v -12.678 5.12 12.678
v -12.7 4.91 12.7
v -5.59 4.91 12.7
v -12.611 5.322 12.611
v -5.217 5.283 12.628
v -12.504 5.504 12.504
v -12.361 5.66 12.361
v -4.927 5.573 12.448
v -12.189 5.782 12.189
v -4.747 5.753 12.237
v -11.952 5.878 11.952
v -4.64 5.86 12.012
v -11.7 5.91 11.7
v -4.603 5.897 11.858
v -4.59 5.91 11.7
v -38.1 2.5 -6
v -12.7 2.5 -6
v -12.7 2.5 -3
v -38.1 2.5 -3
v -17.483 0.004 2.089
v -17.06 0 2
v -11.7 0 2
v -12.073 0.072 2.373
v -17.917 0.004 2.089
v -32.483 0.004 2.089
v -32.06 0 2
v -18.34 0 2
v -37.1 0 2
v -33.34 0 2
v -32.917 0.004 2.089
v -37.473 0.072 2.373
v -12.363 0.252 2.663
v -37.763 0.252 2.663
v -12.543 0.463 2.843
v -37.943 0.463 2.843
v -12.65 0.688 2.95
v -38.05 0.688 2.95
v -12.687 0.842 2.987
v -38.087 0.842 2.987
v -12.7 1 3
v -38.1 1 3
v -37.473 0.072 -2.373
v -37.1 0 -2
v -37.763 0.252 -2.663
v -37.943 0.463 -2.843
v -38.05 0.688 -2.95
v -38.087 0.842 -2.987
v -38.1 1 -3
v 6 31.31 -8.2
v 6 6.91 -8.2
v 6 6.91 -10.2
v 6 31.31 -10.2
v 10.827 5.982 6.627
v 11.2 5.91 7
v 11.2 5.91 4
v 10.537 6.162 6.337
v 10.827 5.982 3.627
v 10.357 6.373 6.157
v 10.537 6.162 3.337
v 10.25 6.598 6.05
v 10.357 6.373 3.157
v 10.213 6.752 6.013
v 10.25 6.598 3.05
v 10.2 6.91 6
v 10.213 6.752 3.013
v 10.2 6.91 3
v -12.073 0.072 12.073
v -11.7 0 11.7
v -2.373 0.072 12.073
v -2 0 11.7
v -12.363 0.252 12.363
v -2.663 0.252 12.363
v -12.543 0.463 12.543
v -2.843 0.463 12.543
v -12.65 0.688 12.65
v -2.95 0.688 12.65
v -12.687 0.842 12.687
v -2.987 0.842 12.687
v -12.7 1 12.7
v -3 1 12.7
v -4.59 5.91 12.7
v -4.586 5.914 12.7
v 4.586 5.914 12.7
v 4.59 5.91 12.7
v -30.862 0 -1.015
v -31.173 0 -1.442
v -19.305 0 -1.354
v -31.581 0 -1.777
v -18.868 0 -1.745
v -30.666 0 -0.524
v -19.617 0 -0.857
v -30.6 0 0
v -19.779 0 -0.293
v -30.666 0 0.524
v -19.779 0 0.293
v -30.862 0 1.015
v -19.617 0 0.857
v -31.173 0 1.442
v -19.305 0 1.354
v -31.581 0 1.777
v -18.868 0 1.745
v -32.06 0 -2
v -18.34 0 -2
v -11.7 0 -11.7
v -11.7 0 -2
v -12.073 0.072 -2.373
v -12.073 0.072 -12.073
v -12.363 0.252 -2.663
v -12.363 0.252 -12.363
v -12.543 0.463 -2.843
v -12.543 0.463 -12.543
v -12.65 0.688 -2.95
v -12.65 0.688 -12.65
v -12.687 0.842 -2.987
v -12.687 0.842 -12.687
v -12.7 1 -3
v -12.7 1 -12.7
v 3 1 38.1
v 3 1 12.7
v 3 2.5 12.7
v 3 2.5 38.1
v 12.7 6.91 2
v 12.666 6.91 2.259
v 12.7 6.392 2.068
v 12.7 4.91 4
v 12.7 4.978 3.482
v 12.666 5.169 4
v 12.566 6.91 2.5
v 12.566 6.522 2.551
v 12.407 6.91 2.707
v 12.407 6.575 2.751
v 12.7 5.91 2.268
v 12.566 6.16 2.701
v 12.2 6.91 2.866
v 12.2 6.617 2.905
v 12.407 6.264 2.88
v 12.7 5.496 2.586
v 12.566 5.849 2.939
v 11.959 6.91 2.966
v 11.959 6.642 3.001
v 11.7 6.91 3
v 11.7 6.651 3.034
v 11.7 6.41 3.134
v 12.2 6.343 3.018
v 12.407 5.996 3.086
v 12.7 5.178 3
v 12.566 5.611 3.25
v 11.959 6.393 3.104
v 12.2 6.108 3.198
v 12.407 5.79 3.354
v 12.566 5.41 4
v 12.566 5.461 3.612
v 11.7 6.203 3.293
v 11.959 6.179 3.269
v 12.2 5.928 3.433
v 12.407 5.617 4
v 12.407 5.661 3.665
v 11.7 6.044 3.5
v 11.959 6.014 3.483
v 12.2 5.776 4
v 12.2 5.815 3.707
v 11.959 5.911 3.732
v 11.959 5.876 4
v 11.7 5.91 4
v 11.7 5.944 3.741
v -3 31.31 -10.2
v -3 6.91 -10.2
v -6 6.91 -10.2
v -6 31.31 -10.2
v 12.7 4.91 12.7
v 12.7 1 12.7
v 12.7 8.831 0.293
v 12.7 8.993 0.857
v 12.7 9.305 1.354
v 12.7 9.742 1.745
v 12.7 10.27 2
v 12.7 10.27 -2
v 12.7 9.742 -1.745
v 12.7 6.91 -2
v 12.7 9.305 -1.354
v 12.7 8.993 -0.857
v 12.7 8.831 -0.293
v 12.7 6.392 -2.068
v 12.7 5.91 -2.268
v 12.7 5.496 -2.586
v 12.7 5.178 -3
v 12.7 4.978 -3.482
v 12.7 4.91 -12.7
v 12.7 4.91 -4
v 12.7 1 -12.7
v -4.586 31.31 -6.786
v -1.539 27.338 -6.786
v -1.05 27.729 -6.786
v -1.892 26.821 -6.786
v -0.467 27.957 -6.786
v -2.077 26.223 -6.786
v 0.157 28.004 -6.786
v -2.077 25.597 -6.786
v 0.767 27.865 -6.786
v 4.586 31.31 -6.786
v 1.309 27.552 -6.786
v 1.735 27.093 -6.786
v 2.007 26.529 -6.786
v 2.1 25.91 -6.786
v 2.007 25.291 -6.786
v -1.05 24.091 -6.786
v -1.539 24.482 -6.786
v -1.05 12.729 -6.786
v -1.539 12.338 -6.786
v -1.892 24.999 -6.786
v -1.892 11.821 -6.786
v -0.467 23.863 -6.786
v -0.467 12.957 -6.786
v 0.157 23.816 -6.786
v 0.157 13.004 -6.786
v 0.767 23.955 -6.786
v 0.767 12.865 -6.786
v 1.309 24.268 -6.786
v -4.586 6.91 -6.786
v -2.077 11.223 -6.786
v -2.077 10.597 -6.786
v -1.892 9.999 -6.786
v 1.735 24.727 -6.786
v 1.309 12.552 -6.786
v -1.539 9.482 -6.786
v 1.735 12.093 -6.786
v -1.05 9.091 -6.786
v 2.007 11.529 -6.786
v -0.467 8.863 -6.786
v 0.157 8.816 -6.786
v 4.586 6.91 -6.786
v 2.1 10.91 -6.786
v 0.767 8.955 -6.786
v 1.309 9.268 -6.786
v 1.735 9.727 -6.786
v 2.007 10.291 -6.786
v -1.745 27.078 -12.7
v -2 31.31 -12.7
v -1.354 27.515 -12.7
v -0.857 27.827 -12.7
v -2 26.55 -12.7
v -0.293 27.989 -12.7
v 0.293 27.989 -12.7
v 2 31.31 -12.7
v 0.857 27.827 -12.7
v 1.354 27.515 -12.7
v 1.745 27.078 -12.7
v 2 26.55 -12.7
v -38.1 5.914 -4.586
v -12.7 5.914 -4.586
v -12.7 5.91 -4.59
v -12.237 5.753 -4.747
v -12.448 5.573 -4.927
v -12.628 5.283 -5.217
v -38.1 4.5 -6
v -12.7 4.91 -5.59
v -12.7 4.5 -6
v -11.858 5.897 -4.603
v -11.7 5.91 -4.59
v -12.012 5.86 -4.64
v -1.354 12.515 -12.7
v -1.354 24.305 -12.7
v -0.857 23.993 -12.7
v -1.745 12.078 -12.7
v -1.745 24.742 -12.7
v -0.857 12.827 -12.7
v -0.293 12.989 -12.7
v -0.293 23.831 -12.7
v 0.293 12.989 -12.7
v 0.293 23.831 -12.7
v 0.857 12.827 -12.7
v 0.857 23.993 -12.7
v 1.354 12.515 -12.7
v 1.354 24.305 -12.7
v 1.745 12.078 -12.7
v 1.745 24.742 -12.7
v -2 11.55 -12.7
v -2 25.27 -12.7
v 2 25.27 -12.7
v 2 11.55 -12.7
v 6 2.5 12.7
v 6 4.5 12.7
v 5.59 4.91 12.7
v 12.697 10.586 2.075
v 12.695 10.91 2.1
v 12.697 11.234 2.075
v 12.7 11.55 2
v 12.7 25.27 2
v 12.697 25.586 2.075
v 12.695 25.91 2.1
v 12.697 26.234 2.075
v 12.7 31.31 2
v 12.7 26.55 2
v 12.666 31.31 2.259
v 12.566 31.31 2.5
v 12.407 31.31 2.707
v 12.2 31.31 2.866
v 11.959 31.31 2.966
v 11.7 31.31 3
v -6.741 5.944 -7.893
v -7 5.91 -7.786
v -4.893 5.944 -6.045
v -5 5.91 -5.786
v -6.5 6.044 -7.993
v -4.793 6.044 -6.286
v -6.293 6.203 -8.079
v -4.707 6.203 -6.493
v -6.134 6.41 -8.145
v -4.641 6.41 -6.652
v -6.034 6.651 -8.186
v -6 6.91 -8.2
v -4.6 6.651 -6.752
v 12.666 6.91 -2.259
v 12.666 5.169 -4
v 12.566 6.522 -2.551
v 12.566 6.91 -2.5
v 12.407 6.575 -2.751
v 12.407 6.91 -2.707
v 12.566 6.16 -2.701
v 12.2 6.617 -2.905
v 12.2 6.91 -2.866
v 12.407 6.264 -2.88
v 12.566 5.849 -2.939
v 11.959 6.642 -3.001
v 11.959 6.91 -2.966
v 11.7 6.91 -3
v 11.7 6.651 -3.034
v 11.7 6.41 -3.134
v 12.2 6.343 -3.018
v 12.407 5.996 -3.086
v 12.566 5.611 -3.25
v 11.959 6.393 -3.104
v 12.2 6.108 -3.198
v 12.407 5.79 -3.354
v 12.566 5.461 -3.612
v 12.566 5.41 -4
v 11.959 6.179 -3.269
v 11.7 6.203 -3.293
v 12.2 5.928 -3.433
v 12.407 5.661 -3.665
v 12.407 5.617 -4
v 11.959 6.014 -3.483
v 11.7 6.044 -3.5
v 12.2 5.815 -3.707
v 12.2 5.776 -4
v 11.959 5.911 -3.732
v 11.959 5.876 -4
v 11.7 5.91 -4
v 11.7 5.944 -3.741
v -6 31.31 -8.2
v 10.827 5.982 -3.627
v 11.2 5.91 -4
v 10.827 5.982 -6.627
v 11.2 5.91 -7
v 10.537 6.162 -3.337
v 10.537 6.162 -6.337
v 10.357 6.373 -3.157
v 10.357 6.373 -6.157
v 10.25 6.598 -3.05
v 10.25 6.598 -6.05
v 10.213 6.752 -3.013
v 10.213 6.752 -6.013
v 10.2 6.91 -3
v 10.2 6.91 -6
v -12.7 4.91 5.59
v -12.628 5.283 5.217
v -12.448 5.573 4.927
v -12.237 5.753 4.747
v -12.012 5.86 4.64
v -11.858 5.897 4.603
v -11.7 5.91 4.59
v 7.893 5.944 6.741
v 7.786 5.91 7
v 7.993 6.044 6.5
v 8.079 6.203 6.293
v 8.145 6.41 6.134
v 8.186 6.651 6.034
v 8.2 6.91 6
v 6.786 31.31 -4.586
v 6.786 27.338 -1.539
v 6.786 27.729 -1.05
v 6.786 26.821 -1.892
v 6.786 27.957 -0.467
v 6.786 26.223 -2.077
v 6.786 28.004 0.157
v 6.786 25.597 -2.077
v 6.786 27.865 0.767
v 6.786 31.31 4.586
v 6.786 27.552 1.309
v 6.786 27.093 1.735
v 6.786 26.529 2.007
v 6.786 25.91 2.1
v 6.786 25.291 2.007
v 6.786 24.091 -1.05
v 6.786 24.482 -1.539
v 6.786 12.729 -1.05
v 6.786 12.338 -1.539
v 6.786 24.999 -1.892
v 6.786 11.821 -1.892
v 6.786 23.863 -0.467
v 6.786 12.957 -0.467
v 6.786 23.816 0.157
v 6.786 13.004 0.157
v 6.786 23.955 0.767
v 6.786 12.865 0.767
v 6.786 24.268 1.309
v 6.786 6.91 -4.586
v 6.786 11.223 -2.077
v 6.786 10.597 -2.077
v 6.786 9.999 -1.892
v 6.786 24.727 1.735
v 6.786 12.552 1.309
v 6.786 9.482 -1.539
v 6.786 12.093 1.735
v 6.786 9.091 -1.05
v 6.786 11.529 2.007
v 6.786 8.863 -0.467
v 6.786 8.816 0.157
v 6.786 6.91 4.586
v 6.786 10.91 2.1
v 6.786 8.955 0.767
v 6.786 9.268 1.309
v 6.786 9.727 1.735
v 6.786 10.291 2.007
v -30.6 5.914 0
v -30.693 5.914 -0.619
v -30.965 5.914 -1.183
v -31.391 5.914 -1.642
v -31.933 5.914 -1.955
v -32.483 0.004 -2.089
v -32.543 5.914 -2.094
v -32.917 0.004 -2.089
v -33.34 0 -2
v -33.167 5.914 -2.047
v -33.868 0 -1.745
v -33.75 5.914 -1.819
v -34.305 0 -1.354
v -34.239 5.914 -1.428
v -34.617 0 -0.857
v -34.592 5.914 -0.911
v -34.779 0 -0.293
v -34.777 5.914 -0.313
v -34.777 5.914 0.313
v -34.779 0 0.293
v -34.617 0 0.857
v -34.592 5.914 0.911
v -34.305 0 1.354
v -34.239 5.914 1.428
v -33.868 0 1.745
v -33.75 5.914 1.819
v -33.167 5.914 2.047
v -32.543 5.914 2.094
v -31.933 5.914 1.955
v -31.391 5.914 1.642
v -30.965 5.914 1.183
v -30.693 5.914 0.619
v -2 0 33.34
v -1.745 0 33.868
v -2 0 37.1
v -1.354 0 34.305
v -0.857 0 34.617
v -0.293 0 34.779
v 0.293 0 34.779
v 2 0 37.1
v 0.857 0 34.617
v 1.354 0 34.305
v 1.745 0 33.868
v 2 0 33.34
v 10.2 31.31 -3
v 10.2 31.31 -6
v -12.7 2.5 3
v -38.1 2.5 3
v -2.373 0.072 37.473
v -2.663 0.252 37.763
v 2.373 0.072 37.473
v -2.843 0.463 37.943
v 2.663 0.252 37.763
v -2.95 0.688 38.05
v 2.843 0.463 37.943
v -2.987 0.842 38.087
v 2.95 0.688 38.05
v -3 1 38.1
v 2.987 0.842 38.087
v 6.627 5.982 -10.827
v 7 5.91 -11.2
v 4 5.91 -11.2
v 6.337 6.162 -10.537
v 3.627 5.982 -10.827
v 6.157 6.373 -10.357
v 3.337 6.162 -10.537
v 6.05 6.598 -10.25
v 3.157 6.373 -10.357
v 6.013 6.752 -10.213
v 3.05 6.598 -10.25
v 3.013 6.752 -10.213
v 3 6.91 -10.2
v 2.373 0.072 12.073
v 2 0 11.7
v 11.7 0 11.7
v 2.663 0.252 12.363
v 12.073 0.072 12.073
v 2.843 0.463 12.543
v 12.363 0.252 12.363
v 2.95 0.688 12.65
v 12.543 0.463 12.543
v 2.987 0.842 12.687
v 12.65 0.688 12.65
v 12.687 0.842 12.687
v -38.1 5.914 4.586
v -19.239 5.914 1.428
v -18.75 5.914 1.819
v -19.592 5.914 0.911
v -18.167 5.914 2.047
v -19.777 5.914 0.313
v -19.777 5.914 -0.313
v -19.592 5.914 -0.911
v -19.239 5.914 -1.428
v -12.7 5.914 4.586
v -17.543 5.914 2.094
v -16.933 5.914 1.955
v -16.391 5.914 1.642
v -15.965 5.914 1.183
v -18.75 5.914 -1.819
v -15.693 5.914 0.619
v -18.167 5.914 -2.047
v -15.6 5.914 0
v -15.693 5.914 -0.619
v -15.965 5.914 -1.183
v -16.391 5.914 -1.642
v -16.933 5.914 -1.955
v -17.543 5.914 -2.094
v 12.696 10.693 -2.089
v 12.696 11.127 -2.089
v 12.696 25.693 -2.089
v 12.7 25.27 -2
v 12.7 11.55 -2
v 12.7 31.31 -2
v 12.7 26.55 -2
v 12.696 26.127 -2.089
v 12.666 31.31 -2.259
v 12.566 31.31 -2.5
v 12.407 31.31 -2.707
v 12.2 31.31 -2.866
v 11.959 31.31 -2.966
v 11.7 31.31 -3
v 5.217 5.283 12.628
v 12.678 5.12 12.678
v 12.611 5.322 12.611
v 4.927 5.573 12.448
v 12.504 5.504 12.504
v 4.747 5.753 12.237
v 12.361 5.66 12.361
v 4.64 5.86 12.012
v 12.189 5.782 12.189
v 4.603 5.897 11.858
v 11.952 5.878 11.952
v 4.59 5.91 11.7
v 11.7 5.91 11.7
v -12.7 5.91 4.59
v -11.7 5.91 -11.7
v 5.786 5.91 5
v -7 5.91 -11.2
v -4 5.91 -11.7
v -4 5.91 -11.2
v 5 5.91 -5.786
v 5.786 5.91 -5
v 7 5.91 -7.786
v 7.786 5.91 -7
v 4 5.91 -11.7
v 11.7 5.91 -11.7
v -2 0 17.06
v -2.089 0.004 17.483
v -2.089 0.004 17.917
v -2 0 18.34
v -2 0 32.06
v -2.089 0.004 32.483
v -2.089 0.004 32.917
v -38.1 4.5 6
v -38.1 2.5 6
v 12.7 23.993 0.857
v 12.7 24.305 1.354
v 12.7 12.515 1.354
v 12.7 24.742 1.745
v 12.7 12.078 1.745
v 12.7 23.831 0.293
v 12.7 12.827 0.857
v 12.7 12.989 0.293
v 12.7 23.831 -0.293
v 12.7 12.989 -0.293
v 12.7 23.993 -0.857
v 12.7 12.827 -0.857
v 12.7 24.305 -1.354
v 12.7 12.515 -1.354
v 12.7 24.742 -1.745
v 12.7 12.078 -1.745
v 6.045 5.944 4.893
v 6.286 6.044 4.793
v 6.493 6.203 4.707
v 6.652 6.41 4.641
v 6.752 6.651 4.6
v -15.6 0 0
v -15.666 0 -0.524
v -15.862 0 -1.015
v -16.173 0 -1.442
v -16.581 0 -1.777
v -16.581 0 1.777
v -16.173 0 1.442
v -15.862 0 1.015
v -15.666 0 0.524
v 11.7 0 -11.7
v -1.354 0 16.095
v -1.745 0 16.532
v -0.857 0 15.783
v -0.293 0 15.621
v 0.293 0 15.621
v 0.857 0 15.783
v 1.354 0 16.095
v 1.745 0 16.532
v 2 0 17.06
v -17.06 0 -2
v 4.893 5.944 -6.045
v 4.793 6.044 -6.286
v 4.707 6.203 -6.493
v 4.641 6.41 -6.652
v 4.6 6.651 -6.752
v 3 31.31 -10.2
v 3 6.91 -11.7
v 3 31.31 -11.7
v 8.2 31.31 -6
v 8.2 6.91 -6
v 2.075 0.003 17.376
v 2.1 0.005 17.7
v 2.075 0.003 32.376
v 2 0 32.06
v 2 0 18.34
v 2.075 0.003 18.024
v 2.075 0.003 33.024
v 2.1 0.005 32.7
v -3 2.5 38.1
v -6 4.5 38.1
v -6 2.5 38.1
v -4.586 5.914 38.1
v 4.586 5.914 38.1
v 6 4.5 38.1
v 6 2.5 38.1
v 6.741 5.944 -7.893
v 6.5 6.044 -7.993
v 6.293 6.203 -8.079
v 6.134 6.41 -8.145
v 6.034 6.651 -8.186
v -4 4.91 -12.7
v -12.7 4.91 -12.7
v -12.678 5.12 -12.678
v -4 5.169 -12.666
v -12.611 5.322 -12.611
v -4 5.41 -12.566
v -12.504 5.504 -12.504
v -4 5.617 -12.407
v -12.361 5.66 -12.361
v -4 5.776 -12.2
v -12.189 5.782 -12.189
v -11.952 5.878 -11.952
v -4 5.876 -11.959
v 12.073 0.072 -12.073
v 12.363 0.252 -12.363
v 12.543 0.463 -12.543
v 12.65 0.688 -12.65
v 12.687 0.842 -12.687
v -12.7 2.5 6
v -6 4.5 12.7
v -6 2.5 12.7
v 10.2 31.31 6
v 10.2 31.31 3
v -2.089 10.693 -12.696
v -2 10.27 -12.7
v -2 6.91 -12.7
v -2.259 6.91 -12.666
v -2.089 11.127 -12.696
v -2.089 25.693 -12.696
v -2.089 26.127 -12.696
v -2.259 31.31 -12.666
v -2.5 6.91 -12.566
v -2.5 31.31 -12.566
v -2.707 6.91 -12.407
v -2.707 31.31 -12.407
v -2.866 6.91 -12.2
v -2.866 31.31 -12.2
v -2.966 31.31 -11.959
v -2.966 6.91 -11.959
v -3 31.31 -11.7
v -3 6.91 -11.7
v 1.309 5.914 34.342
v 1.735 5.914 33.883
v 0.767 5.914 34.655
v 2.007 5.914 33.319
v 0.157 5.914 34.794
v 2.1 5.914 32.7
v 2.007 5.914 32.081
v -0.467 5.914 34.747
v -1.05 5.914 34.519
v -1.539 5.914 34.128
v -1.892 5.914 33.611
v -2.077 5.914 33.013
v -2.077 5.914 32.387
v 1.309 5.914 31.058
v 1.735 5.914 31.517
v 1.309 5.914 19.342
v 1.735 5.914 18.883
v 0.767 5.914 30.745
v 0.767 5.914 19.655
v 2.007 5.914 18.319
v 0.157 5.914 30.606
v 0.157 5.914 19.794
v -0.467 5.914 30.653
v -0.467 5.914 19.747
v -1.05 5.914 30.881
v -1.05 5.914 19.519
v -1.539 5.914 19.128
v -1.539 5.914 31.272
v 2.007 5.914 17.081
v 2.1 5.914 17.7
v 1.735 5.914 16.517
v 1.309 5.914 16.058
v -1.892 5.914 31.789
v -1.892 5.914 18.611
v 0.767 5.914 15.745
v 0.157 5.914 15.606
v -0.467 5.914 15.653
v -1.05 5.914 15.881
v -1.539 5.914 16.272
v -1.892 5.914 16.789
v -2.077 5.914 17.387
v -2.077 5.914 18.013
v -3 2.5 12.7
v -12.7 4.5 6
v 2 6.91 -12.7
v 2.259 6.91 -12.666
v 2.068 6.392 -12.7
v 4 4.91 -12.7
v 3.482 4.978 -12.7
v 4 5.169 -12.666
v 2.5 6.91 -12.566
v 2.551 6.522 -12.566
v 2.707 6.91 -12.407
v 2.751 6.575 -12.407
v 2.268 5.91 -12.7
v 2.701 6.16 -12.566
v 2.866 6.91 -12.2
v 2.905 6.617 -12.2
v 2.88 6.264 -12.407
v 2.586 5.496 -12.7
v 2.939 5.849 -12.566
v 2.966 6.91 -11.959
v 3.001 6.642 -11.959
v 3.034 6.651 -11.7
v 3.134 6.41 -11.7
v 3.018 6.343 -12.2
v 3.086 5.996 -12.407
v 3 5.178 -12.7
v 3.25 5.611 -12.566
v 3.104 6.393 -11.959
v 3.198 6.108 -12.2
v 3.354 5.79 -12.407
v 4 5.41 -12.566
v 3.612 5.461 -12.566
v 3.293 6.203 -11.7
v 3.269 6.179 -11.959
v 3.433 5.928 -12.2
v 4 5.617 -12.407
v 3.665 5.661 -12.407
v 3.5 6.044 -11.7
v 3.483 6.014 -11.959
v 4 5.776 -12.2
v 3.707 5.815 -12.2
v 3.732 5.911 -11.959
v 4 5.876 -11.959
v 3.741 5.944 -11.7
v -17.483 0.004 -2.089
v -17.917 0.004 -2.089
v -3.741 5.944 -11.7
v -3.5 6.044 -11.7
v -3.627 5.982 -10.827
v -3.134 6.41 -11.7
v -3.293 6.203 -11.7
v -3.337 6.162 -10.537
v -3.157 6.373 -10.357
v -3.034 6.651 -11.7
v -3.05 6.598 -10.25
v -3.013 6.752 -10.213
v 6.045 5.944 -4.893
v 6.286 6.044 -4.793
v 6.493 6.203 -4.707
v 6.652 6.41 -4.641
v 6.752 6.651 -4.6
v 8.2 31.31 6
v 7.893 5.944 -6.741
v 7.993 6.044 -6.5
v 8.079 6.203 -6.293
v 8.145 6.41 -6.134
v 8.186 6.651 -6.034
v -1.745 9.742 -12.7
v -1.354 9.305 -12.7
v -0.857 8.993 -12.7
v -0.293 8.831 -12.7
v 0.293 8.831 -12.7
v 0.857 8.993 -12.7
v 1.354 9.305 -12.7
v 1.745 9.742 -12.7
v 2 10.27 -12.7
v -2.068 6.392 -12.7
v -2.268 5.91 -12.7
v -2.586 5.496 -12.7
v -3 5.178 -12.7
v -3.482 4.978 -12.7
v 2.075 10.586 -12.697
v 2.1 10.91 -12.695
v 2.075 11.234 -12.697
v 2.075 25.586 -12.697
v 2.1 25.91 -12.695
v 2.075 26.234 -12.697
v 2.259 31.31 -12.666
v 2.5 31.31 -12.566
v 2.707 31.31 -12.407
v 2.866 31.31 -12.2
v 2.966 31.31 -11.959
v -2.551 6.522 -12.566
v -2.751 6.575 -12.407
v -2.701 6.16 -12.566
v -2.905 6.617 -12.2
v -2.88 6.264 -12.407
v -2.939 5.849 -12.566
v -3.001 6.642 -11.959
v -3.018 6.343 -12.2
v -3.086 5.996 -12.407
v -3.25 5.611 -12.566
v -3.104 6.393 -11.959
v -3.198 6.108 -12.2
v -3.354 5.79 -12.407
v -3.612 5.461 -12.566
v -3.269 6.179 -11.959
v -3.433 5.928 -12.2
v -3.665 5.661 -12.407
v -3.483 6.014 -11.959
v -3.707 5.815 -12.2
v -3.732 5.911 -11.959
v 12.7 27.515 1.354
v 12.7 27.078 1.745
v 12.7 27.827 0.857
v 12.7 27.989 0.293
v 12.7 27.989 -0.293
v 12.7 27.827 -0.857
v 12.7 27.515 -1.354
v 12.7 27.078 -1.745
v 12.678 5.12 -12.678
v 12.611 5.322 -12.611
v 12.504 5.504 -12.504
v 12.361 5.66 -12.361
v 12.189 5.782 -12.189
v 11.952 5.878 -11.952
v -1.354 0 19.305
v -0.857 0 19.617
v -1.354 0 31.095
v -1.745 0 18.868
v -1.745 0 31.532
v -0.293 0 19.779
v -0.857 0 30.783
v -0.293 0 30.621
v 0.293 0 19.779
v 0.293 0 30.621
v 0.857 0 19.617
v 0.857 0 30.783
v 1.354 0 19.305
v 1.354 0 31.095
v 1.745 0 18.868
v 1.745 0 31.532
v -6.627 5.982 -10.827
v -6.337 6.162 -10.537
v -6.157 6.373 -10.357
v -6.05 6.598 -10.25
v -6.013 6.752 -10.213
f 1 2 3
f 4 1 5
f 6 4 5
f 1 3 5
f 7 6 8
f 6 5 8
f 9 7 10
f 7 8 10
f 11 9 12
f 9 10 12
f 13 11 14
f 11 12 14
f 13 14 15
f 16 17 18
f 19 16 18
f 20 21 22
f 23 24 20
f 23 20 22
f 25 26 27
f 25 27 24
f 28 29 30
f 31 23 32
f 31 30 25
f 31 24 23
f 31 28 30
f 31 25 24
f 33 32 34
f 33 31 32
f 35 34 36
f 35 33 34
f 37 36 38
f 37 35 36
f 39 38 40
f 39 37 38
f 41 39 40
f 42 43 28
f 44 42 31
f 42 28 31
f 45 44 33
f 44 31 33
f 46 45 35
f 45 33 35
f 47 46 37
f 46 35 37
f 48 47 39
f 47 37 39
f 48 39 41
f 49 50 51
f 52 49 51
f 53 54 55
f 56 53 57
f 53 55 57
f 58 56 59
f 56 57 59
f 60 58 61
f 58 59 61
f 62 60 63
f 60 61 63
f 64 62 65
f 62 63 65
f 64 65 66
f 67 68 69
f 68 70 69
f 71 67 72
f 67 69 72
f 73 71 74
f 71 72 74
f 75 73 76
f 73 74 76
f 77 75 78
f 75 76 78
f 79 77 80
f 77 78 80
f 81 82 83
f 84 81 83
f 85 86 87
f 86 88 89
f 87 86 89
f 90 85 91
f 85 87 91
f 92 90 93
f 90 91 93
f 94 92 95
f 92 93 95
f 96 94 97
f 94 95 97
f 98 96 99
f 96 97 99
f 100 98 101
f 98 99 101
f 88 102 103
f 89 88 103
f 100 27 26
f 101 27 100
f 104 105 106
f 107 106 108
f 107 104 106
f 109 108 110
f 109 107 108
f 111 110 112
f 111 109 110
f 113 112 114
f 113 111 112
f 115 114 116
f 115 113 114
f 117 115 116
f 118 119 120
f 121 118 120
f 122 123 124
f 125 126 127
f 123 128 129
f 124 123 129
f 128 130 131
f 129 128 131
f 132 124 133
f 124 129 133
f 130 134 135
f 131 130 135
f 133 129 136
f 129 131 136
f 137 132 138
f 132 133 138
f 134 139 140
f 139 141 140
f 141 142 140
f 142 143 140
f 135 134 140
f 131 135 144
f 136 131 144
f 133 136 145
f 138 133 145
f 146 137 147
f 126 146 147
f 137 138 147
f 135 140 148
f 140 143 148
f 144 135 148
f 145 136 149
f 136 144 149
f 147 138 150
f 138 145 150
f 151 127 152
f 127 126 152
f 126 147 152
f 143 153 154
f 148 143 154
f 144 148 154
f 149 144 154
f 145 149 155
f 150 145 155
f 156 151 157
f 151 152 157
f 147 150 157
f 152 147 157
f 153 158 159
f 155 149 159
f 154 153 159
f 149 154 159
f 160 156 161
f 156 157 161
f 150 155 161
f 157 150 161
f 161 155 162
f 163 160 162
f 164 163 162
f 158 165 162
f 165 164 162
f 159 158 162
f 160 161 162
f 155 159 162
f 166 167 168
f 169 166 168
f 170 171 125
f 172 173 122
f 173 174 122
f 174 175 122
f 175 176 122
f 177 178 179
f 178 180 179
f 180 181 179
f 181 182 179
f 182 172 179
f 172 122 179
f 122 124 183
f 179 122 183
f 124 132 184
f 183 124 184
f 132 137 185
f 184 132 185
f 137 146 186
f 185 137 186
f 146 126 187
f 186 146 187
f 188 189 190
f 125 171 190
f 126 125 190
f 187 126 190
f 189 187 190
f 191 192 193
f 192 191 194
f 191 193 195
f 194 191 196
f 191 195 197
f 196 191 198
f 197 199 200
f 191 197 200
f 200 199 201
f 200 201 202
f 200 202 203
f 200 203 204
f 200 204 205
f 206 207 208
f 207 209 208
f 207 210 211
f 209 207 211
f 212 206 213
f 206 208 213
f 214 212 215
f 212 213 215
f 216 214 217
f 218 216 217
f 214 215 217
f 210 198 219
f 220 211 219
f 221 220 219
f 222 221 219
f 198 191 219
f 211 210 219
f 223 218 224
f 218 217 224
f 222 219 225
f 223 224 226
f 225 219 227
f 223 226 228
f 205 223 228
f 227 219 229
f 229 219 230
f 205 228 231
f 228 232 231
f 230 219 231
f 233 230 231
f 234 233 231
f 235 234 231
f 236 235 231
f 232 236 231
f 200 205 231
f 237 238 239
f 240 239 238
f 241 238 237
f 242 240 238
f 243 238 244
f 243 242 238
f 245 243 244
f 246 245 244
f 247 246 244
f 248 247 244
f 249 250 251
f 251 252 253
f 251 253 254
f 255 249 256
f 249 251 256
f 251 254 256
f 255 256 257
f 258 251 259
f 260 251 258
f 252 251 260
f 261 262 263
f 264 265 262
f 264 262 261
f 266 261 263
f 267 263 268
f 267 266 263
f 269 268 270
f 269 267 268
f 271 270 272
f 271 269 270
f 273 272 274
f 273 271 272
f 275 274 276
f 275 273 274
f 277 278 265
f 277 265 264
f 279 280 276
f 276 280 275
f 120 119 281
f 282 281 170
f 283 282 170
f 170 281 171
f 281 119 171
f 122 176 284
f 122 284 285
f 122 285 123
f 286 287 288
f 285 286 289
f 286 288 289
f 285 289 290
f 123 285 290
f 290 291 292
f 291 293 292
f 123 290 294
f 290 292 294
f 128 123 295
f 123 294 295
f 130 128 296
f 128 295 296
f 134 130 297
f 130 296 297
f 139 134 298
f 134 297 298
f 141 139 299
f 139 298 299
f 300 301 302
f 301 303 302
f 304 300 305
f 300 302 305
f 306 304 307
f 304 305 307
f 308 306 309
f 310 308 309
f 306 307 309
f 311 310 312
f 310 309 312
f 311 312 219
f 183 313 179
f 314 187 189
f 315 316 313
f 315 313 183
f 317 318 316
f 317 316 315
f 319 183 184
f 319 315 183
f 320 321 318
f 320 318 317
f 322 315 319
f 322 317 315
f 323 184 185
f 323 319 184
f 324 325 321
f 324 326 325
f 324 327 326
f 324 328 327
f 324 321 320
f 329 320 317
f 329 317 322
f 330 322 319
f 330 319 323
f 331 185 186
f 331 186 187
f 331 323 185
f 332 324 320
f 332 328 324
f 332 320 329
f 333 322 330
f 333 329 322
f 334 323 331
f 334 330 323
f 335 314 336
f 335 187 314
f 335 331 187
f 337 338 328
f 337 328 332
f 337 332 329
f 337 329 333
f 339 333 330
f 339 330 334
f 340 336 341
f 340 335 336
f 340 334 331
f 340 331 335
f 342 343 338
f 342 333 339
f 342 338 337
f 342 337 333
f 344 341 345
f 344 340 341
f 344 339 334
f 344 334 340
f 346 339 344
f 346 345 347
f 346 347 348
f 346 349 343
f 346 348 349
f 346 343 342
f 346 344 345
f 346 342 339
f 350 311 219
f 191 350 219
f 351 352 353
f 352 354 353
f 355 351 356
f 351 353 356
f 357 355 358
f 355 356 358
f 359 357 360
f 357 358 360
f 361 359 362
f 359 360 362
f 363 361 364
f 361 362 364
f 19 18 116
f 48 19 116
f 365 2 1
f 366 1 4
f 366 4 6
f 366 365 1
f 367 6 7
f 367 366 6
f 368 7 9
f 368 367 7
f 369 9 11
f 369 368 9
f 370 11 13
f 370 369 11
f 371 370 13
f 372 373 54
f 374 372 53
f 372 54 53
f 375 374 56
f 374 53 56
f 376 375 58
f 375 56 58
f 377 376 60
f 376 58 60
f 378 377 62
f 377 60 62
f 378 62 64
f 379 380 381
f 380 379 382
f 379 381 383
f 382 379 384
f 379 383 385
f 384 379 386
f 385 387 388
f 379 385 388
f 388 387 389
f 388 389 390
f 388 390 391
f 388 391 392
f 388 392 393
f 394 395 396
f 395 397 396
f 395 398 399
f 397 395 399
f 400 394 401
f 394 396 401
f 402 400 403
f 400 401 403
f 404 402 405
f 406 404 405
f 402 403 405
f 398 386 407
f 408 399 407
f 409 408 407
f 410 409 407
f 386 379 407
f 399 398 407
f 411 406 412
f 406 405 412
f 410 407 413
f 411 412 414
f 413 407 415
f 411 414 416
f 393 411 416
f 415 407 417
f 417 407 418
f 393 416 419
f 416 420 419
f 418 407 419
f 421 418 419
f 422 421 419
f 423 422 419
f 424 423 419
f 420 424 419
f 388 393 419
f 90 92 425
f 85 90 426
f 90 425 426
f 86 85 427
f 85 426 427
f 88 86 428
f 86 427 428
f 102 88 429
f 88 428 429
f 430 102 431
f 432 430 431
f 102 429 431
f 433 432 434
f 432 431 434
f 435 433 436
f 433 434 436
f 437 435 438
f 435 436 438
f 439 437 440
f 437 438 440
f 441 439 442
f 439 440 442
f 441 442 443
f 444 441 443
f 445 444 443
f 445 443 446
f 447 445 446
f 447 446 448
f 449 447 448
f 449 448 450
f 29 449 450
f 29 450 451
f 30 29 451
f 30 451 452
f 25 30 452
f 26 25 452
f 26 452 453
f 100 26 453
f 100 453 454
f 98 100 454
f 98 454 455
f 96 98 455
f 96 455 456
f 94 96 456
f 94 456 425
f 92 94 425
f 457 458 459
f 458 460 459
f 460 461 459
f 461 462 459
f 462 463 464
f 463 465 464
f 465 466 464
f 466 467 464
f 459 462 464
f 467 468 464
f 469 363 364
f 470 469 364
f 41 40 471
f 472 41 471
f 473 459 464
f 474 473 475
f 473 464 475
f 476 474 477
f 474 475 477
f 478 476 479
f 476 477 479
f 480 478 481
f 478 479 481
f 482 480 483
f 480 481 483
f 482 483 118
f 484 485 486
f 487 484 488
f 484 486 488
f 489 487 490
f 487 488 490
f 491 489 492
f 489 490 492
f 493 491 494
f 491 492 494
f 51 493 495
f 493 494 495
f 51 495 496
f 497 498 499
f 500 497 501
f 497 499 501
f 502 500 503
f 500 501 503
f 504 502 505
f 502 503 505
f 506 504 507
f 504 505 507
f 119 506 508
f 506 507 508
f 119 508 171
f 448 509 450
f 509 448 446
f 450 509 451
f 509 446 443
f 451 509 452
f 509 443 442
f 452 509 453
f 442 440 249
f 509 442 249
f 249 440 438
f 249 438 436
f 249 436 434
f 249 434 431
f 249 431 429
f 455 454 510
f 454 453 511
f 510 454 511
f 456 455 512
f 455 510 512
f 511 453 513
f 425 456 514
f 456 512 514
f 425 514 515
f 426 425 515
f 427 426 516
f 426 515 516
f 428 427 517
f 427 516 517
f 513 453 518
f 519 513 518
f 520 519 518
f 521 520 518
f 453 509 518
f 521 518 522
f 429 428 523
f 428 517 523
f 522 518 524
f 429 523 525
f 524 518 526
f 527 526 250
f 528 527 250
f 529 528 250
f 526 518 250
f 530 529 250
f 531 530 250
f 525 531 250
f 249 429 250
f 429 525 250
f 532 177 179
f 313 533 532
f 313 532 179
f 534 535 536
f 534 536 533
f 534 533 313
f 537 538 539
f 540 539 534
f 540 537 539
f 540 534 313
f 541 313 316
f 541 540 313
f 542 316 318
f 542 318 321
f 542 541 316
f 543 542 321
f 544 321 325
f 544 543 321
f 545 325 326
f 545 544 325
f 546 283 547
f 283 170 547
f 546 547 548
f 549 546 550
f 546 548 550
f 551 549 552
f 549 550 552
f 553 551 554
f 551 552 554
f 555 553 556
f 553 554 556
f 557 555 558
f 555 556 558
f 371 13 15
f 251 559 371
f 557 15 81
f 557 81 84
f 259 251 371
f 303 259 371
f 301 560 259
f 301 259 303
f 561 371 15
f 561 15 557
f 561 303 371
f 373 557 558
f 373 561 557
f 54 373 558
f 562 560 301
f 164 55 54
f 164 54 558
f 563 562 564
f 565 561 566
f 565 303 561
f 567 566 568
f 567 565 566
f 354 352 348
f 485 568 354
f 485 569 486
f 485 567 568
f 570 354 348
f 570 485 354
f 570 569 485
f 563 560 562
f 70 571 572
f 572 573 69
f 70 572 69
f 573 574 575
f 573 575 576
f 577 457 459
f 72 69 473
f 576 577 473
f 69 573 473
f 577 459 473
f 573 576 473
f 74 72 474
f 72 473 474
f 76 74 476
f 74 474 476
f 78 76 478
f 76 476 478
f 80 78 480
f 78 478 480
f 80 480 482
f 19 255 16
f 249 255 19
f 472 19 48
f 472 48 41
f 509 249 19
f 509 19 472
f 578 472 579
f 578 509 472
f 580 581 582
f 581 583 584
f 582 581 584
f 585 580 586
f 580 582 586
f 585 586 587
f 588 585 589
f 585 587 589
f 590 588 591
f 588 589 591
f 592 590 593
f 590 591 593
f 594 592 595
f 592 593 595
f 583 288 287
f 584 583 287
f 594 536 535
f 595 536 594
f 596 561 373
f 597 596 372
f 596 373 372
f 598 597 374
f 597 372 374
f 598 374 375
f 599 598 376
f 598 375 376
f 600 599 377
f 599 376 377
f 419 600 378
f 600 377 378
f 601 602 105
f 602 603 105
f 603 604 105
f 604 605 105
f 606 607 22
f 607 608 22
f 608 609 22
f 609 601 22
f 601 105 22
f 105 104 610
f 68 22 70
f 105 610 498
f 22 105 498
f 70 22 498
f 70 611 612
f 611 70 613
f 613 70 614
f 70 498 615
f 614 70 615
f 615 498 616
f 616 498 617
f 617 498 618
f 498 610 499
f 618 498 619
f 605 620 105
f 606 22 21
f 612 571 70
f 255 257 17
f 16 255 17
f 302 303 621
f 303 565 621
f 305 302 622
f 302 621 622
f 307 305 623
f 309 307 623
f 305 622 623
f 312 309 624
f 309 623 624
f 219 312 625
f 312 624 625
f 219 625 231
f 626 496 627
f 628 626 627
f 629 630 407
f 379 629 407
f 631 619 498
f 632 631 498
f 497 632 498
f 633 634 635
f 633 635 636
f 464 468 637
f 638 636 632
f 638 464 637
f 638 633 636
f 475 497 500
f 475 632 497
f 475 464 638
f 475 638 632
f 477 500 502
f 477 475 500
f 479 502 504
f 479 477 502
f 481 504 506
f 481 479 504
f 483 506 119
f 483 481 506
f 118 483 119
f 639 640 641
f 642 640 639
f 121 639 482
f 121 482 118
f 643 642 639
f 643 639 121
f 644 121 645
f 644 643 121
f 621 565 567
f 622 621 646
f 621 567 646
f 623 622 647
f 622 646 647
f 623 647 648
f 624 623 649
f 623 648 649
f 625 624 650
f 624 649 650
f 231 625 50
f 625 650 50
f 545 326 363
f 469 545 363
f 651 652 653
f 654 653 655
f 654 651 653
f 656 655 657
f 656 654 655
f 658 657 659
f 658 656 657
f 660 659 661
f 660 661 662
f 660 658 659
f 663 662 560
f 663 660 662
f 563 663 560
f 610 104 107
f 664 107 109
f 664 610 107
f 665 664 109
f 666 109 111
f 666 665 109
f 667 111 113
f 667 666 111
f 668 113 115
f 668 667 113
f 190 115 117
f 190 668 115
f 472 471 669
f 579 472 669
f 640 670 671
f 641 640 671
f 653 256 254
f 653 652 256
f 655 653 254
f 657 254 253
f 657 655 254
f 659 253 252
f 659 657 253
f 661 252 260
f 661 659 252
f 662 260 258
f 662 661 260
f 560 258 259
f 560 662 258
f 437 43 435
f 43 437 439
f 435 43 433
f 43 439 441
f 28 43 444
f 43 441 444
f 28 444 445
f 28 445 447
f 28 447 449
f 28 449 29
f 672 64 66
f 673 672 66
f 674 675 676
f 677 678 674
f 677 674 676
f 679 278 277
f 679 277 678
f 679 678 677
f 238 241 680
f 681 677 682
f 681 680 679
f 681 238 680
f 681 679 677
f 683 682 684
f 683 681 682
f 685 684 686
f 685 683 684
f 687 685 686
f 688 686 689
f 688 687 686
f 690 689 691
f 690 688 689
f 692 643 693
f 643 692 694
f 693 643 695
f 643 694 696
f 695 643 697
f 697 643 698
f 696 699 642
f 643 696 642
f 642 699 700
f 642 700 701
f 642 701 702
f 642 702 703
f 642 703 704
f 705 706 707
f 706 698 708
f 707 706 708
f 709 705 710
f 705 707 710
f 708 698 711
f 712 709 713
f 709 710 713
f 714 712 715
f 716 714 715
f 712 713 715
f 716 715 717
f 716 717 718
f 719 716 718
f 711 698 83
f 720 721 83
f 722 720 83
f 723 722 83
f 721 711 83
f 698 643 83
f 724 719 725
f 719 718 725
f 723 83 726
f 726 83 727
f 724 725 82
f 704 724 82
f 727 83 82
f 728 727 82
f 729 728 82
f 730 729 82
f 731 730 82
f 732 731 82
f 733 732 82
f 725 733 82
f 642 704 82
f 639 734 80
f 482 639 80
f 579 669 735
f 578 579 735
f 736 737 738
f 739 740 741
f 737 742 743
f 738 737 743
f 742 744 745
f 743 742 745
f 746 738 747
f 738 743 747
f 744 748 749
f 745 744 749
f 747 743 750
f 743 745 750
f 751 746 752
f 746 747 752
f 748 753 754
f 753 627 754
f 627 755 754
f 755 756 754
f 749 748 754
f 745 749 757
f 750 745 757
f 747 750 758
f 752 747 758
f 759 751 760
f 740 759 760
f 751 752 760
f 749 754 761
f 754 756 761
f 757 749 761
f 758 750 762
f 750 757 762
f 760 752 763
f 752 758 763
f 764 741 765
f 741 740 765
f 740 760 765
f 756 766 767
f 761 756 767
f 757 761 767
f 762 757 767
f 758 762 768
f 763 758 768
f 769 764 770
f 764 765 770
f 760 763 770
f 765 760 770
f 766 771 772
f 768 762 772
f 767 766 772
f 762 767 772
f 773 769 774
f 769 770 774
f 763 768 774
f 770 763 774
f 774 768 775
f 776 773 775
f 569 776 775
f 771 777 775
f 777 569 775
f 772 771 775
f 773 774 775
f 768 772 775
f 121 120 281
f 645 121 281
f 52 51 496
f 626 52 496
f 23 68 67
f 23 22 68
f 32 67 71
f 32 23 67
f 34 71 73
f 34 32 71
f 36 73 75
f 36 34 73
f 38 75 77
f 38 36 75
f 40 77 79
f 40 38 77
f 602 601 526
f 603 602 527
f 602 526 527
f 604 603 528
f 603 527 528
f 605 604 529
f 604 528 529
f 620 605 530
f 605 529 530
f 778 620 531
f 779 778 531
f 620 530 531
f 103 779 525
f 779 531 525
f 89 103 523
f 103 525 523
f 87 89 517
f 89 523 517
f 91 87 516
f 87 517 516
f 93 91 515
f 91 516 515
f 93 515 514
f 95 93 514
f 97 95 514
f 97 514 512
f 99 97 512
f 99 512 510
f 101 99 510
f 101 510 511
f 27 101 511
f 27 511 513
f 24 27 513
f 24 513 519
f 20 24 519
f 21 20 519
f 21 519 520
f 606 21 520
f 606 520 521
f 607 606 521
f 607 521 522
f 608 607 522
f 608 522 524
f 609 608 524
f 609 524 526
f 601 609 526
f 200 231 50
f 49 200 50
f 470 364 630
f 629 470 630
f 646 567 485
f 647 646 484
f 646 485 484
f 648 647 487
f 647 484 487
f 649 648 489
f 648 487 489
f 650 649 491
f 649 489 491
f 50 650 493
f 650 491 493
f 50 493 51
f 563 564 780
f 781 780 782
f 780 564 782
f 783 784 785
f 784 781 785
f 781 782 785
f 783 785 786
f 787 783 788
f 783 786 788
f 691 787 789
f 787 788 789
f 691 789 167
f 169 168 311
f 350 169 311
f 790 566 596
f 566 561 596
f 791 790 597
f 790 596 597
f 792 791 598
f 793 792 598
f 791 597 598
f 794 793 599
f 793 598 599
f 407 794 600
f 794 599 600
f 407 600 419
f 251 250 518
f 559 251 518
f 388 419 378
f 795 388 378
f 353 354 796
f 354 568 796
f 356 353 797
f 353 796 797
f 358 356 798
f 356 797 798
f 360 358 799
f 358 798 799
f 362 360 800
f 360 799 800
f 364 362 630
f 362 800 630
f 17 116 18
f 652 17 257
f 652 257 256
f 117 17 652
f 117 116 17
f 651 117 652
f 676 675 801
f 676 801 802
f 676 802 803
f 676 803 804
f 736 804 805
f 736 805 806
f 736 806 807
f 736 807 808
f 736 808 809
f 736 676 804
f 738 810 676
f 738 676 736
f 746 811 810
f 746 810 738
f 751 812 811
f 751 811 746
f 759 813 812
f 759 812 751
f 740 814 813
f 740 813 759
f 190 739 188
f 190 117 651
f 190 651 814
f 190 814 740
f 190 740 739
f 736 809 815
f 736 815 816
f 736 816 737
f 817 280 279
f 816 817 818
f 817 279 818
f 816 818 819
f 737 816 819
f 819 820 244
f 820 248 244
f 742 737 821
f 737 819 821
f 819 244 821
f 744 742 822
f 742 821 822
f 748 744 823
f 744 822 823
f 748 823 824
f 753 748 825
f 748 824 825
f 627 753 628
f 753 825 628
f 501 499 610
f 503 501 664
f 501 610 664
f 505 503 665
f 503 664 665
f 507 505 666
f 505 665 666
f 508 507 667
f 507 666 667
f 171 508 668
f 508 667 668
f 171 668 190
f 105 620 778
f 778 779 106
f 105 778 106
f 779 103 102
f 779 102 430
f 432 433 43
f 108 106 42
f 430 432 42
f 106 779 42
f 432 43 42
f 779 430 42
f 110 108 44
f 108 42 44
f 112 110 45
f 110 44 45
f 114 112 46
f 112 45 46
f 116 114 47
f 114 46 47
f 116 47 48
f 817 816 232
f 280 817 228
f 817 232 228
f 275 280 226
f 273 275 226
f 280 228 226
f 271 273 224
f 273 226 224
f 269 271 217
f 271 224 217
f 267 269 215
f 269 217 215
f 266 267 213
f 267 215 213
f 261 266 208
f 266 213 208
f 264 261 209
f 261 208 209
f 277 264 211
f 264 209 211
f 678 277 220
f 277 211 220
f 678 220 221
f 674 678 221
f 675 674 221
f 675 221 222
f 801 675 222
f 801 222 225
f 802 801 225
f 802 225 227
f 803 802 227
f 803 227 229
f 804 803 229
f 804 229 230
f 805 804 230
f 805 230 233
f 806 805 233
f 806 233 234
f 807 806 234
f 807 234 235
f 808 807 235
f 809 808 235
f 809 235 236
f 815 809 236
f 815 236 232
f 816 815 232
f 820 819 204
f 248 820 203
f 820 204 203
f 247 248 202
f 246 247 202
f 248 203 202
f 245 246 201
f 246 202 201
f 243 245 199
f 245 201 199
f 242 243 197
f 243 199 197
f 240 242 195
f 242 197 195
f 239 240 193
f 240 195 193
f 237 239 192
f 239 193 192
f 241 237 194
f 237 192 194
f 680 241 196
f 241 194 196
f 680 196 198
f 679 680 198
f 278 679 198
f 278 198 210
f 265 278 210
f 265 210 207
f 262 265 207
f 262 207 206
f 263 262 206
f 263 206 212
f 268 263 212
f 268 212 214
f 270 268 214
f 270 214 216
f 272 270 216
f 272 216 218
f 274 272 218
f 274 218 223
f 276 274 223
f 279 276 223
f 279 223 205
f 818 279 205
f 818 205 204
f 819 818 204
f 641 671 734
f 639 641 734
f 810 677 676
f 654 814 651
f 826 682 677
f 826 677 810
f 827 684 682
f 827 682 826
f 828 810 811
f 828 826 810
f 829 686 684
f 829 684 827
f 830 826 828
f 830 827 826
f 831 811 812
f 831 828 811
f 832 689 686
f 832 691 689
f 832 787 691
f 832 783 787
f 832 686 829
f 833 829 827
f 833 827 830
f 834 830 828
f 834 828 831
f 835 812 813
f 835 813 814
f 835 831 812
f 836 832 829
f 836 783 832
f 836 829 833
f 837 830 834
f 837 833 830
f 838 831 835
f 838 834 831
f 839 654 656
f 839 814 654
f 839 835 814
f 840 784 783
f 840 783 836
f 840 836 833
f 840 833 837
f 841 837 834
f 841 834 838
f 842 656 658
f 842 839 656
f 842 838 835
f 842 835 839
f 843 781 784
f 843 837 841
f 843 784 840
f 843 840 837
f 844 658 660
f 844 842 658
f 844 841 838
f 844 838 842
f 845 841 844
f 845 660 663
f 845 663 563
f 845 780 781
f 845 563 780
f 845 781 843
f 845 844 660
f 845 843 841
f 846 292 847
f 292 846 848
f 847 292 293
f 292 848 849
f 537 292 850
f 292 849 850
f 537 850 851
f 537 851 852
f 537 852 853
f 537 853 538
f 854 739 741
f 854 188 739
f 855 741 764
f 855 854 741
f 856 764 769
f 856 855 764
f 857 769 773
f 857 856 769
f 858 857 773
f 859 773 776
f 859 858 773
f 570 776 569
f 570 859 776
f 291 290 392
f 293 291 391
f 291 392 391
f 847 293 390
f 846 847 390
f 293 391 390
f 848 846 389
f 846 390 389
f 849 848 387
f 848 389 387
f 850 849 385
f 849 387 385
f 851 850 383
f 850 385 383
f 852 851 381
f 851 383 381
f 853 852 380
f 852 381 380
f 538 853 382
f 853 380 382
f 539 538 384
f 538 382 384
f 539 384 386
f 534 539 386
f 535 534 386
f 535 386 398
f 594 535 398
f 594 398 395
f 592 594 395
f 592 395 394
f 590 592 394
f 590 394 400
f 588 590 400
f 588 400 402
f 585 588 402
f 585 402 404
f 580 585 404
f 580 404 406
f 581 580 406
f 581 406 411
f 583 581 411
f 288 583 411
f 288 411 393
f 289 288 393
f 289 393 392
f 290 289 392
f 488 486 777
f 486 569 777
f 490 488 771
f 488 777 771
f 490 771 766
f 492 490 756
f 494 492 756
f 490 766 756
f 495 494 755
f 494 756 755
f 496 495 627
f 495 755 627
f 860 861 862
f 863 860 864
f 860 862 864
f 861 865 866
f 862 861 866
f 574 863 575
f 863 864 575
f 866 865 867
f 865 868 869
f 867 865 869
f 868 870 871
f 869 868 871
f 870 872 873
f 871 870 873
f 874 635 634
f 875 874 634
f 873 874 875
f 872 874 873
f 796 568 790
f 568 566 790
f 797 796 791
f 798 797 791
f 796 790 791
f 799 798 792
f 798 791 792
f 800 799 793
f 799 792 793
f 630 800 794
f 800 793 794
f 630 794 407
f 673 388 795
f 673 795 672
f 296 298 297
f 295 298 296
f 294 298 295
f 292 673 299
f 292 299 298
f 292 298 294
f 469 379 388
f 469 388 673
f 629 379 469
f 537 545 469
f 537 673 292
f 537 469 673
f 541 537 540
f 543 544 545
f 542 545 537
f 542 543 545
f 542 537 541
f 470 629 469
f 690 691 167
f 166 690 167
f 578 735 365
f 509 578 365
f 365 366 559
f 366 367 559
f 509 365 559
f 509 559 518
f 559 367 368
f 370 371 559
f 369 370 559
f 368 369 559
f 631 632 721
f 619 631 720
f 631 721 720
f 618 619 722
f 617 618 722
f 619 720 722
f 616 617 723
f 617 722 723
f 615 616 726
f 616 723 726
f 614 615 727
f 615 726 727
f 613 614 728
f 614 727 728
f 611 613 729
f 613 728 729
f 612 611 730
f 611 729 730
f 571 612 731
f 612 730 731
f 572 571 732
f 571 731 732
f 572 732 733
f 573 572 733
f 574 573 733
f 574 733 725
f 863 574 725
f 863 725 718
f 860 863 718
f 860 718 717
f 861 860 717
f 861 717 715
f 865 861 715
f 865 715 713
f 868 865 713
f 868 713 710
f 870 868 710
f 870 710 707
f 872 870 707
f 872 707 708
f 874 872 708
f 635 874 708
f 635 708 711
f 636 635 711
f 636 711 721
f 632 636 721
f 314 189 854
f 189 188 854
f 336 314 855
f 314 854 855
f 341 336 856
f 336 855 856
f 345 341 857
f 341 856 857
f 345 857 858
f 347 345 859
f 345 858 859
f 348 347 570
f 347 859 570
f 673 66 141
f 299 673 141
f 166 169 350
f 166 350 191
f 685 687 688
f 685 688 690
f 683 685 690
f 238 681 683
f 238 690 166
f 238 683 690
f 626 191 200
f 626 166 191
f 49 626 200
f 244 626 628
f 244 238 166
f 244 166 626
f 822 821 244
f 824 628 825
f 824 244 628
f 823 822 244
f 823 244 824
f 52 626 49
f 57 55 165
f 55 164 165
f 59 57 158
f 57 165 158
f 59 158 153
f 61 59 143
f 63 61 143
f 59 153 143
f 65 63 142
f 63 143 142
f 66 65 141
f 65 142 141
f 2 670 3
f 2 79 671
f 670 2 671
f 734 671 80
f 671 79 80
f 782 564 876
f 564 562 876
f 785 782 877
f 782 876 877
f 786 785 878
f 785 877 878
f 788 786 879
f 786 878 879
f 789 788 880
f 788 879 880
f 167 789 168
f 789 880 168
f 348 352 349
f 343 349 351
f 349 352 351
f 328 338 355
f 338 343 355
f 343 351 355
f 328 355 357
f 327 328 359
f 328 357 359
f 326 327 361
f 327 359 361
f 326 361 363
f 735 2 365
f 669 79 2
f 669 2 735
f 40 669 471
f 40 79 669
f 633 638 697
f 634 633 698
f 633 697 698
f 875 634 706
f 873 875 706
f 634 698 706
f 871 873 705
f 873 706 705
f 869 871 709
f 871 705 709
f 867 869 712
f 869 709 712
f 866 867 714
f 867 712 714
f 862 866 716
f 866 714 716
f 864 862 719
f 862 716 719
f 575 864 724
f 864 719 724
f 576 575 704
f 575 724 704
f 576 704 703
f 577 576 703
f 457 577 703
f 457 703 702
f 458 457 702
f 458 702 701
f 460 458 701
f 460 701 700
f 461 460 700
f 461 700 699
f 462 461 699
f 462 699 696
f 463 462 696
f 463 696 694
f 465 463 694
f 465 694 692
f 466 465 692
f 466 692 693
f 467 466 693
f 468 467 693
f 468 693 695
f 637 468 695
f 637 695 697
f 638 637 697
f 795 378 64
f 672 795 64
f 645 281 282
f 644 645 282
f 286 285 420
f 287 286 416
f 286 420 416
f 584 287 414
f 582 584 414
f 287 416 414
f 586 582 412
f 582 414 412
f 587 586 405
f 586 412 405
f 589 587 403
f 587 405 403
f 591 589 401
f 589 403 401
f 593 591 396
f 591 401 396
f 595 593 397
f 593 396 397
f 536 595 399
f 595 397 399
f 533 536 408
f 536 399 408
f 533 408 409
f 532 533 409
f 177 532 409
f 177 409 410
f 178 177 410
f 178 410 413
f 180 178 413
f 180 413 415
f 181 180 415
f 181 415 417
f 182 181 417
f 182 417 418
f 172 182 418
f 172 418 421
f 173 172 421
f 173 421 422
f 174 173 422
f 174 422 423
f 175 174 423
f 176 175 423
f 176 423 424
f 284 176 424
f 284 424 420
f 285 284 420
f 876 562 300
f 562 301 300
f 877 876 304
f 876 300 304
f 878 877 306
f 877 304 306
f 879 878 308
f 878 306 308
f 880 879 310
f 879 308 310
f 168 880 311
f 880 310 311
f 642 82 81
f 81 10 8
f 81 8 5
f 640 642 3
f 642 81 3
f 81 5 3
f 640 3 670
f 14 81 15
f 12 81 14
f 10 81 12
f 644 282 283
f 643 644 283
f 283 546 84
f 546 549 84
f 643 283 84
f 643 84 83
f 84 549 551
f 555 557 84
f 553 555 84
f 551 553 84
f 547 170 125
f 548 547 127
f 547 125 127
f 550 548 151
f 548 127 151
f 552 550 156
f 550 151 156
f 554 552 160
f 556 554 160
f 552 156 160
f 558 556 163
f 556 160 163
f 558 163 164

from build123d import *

# Parameters (mm, degrees)
SKETCH1_W             = 25.4
SKETCH1_H             = 25.4
BOSS_EXTRUDE1_DEPTH   = 5.91
BOSS_EXTRUDE2_DEPTH   = 25.4
BOSS_EXTRUDE3_DEPTH   = 25.4
BOSS_EXTRUDE4_DEPTH   = 25.4
FILLET2_R             = 1
M5X0_8_TAPPED_HOLE2_D = 4.2
M5X0_8_TAPPED_HOLE3_D = 4.2
M5X0_8_TAPPED_HOLE4_D = 4.2


with BuildPart() as part:
    # Sketch1 → Boss-Extrude1 (new body)
    with BuildSketch(Plane(origin=(0, 0, 0), x_dir=(1, 0, 0), z_dir=(0, 1, 0))):
        Rectangle(SKETCH1_W, SKETCH1_H)
    extrude(amount=BOSS_EXTRUDE1_DEPTH)

    # Sketch2 → Boss-Extrude2 (add)
    with BuildSketch(Plane.XY.offset(12.7)):
        Polygon((-3, 0), (3, 0), (3, 2.5), (6, 2.5), (6, 4.5), (4.585786438, 5.914213562), (-4.585786438, 5.914213562), (-6, 4.5), (-6, 2.5), (-3, 2.5), align=None)
    extrude(amount=BOSS_EXTRUDE2_DEPTH)

    # Sketch3 → Boss-Extrude3 (add)
    with BuildSketch(Plane.ZY.offset(12.7)):
        Polygon((-3, 0), (3, 0), (3, 2.5), (6, 2.5), (6, 4.5), (4.585786438, 5.914213562), (-4.585786438, 5.914213562), (-6, 4.5), (-6, 2.5), (-3, 2.5), align=None)
    extrude(amount=BOSS_EXTRUDE3_DEPTH)

    # Sketch5 → Boss-Extrude4 (add)
    with BuildSketch(Plane(origin=(0, 5.91, 0), x_dir=(1, 0, 0), z_dir=(0, 1, 0))):
        Polygon((3, 12.7), (-3, 12.7), (-3, 10.2), (-6, 10.2), (-6, 8.2), (-4.585786438, 6.785786438), (4.585786438, 6.785786438), (6, 8.2), (6, 10.2), (3, 10.2), align=None)
        Polygon((12.7, -3), (12.7, 3), (10.2, 3), (10.2, 6), (8.2, 6), (6.785786438, 4.585786438), (6.785786438, -4.585786438), (8.2, -6), (10.2, -6), (10.2, -3), align=None)
    extrude(amount=BOSS_EXTRUDE4_DEPTH)

    # Fillet2
    fillet2_edges = [part.edges().sort_by_distance(p)[0] for p in [
        (7.492893219, 5.91, -5.292893219),
        (6.785786438, 5.91, 0),
        (7.492893219, 5.91, 5.292893219),
        (9.2, 5.91, 6),
        (10.2, 5.91, 4.5),
        (11.45, 5.91, 3),
        (12.7, 18.61, 3),
        (-12.7, 5.91, -8.645),
        (7.85, 0, 12.7),
        (8.645, 5.91, 12.7),
        (-8.645, 5.91, 12.7),
        (3, 0, 25.4),
        (-3, 0, 25.4),
        (0, 0, 38.1),
        (-12.7, 0, 7.85),
        (-12.7, 5.91, 8.645),
        (-25.4, 0, 3),
        (12.7, 5.91, 7.85),
        (-7.85, 0, 12.7),
        (-12.7, 0, -7.85),
        (-25.4, 0, -3),
        (-38.1, 0, 0),
        (0, 0, -12.7),
        (12.7, 0, 0),
        (12.7, 5.91, -7.85),
        (-7.85, 5.91, -12.7),
        (-3, 5.91, -11.45),
        (-3, 18.61, -12.7),
        (-4.5, 5.91, -10.2),
        (-6, 5.91, -9.2),
        (-5.292893219, 5.91, -7.492893219),
        (0, 5.91, -6.785786438),
        (5.292893219, 5.91, -7.492893219),
        (6, 5.91, -9.2),
        (4.5, 5.91, -10.2),
        (3, 5.91, -11.45),
        (3, 18.61, -12.7),
        (7.85, 5.91, -12.7),
        (11.45, 5.91, -3),
        (12.7, 18.61, -3),
        (10.2, 5.91, -4.5),
        (9.2, 5.91, -6),
    ]]
    fillet(fillet2_edges, radius=FILLET2_R)

    # M5x0.8 Tapped Hole2 (through all)
    with Locations(Plane(origin=(0, 0, 0), x_dir=(-1, 0, 0), z_dir=(0, -1, 0))):
        with Locations((0, -17.7), (0, -32.7), (17.7, 0), (32.7, 0)):
            Hole(M5X0_8_TAPPED_HOLE2_D / 2)

    # M5x0.8 Tapped Hole3 (through all)
    with Locations(Plane(origin=(12.7, 0, 0), x_dir=(0, 0, -1), z_dir=(1, 0, 0))):
        with Locations((0, 10.91), (0, 25.91)):
            Hole(M5X0_8_TAPPED_HOLE3_D / 2)

    # M5x0.8 Tapped Hole4 (through all)
    with Locations(Plane(origin=(0, 0, -12.7), x_dir=(-1, 0, 0), z_dir=(0, 0, -1))):
        with Locations((0, 25.91), (0, 10.91)):
            Hole(M5X0_8_TAPPED_HOLE4_D / 2)


solid = part.part
